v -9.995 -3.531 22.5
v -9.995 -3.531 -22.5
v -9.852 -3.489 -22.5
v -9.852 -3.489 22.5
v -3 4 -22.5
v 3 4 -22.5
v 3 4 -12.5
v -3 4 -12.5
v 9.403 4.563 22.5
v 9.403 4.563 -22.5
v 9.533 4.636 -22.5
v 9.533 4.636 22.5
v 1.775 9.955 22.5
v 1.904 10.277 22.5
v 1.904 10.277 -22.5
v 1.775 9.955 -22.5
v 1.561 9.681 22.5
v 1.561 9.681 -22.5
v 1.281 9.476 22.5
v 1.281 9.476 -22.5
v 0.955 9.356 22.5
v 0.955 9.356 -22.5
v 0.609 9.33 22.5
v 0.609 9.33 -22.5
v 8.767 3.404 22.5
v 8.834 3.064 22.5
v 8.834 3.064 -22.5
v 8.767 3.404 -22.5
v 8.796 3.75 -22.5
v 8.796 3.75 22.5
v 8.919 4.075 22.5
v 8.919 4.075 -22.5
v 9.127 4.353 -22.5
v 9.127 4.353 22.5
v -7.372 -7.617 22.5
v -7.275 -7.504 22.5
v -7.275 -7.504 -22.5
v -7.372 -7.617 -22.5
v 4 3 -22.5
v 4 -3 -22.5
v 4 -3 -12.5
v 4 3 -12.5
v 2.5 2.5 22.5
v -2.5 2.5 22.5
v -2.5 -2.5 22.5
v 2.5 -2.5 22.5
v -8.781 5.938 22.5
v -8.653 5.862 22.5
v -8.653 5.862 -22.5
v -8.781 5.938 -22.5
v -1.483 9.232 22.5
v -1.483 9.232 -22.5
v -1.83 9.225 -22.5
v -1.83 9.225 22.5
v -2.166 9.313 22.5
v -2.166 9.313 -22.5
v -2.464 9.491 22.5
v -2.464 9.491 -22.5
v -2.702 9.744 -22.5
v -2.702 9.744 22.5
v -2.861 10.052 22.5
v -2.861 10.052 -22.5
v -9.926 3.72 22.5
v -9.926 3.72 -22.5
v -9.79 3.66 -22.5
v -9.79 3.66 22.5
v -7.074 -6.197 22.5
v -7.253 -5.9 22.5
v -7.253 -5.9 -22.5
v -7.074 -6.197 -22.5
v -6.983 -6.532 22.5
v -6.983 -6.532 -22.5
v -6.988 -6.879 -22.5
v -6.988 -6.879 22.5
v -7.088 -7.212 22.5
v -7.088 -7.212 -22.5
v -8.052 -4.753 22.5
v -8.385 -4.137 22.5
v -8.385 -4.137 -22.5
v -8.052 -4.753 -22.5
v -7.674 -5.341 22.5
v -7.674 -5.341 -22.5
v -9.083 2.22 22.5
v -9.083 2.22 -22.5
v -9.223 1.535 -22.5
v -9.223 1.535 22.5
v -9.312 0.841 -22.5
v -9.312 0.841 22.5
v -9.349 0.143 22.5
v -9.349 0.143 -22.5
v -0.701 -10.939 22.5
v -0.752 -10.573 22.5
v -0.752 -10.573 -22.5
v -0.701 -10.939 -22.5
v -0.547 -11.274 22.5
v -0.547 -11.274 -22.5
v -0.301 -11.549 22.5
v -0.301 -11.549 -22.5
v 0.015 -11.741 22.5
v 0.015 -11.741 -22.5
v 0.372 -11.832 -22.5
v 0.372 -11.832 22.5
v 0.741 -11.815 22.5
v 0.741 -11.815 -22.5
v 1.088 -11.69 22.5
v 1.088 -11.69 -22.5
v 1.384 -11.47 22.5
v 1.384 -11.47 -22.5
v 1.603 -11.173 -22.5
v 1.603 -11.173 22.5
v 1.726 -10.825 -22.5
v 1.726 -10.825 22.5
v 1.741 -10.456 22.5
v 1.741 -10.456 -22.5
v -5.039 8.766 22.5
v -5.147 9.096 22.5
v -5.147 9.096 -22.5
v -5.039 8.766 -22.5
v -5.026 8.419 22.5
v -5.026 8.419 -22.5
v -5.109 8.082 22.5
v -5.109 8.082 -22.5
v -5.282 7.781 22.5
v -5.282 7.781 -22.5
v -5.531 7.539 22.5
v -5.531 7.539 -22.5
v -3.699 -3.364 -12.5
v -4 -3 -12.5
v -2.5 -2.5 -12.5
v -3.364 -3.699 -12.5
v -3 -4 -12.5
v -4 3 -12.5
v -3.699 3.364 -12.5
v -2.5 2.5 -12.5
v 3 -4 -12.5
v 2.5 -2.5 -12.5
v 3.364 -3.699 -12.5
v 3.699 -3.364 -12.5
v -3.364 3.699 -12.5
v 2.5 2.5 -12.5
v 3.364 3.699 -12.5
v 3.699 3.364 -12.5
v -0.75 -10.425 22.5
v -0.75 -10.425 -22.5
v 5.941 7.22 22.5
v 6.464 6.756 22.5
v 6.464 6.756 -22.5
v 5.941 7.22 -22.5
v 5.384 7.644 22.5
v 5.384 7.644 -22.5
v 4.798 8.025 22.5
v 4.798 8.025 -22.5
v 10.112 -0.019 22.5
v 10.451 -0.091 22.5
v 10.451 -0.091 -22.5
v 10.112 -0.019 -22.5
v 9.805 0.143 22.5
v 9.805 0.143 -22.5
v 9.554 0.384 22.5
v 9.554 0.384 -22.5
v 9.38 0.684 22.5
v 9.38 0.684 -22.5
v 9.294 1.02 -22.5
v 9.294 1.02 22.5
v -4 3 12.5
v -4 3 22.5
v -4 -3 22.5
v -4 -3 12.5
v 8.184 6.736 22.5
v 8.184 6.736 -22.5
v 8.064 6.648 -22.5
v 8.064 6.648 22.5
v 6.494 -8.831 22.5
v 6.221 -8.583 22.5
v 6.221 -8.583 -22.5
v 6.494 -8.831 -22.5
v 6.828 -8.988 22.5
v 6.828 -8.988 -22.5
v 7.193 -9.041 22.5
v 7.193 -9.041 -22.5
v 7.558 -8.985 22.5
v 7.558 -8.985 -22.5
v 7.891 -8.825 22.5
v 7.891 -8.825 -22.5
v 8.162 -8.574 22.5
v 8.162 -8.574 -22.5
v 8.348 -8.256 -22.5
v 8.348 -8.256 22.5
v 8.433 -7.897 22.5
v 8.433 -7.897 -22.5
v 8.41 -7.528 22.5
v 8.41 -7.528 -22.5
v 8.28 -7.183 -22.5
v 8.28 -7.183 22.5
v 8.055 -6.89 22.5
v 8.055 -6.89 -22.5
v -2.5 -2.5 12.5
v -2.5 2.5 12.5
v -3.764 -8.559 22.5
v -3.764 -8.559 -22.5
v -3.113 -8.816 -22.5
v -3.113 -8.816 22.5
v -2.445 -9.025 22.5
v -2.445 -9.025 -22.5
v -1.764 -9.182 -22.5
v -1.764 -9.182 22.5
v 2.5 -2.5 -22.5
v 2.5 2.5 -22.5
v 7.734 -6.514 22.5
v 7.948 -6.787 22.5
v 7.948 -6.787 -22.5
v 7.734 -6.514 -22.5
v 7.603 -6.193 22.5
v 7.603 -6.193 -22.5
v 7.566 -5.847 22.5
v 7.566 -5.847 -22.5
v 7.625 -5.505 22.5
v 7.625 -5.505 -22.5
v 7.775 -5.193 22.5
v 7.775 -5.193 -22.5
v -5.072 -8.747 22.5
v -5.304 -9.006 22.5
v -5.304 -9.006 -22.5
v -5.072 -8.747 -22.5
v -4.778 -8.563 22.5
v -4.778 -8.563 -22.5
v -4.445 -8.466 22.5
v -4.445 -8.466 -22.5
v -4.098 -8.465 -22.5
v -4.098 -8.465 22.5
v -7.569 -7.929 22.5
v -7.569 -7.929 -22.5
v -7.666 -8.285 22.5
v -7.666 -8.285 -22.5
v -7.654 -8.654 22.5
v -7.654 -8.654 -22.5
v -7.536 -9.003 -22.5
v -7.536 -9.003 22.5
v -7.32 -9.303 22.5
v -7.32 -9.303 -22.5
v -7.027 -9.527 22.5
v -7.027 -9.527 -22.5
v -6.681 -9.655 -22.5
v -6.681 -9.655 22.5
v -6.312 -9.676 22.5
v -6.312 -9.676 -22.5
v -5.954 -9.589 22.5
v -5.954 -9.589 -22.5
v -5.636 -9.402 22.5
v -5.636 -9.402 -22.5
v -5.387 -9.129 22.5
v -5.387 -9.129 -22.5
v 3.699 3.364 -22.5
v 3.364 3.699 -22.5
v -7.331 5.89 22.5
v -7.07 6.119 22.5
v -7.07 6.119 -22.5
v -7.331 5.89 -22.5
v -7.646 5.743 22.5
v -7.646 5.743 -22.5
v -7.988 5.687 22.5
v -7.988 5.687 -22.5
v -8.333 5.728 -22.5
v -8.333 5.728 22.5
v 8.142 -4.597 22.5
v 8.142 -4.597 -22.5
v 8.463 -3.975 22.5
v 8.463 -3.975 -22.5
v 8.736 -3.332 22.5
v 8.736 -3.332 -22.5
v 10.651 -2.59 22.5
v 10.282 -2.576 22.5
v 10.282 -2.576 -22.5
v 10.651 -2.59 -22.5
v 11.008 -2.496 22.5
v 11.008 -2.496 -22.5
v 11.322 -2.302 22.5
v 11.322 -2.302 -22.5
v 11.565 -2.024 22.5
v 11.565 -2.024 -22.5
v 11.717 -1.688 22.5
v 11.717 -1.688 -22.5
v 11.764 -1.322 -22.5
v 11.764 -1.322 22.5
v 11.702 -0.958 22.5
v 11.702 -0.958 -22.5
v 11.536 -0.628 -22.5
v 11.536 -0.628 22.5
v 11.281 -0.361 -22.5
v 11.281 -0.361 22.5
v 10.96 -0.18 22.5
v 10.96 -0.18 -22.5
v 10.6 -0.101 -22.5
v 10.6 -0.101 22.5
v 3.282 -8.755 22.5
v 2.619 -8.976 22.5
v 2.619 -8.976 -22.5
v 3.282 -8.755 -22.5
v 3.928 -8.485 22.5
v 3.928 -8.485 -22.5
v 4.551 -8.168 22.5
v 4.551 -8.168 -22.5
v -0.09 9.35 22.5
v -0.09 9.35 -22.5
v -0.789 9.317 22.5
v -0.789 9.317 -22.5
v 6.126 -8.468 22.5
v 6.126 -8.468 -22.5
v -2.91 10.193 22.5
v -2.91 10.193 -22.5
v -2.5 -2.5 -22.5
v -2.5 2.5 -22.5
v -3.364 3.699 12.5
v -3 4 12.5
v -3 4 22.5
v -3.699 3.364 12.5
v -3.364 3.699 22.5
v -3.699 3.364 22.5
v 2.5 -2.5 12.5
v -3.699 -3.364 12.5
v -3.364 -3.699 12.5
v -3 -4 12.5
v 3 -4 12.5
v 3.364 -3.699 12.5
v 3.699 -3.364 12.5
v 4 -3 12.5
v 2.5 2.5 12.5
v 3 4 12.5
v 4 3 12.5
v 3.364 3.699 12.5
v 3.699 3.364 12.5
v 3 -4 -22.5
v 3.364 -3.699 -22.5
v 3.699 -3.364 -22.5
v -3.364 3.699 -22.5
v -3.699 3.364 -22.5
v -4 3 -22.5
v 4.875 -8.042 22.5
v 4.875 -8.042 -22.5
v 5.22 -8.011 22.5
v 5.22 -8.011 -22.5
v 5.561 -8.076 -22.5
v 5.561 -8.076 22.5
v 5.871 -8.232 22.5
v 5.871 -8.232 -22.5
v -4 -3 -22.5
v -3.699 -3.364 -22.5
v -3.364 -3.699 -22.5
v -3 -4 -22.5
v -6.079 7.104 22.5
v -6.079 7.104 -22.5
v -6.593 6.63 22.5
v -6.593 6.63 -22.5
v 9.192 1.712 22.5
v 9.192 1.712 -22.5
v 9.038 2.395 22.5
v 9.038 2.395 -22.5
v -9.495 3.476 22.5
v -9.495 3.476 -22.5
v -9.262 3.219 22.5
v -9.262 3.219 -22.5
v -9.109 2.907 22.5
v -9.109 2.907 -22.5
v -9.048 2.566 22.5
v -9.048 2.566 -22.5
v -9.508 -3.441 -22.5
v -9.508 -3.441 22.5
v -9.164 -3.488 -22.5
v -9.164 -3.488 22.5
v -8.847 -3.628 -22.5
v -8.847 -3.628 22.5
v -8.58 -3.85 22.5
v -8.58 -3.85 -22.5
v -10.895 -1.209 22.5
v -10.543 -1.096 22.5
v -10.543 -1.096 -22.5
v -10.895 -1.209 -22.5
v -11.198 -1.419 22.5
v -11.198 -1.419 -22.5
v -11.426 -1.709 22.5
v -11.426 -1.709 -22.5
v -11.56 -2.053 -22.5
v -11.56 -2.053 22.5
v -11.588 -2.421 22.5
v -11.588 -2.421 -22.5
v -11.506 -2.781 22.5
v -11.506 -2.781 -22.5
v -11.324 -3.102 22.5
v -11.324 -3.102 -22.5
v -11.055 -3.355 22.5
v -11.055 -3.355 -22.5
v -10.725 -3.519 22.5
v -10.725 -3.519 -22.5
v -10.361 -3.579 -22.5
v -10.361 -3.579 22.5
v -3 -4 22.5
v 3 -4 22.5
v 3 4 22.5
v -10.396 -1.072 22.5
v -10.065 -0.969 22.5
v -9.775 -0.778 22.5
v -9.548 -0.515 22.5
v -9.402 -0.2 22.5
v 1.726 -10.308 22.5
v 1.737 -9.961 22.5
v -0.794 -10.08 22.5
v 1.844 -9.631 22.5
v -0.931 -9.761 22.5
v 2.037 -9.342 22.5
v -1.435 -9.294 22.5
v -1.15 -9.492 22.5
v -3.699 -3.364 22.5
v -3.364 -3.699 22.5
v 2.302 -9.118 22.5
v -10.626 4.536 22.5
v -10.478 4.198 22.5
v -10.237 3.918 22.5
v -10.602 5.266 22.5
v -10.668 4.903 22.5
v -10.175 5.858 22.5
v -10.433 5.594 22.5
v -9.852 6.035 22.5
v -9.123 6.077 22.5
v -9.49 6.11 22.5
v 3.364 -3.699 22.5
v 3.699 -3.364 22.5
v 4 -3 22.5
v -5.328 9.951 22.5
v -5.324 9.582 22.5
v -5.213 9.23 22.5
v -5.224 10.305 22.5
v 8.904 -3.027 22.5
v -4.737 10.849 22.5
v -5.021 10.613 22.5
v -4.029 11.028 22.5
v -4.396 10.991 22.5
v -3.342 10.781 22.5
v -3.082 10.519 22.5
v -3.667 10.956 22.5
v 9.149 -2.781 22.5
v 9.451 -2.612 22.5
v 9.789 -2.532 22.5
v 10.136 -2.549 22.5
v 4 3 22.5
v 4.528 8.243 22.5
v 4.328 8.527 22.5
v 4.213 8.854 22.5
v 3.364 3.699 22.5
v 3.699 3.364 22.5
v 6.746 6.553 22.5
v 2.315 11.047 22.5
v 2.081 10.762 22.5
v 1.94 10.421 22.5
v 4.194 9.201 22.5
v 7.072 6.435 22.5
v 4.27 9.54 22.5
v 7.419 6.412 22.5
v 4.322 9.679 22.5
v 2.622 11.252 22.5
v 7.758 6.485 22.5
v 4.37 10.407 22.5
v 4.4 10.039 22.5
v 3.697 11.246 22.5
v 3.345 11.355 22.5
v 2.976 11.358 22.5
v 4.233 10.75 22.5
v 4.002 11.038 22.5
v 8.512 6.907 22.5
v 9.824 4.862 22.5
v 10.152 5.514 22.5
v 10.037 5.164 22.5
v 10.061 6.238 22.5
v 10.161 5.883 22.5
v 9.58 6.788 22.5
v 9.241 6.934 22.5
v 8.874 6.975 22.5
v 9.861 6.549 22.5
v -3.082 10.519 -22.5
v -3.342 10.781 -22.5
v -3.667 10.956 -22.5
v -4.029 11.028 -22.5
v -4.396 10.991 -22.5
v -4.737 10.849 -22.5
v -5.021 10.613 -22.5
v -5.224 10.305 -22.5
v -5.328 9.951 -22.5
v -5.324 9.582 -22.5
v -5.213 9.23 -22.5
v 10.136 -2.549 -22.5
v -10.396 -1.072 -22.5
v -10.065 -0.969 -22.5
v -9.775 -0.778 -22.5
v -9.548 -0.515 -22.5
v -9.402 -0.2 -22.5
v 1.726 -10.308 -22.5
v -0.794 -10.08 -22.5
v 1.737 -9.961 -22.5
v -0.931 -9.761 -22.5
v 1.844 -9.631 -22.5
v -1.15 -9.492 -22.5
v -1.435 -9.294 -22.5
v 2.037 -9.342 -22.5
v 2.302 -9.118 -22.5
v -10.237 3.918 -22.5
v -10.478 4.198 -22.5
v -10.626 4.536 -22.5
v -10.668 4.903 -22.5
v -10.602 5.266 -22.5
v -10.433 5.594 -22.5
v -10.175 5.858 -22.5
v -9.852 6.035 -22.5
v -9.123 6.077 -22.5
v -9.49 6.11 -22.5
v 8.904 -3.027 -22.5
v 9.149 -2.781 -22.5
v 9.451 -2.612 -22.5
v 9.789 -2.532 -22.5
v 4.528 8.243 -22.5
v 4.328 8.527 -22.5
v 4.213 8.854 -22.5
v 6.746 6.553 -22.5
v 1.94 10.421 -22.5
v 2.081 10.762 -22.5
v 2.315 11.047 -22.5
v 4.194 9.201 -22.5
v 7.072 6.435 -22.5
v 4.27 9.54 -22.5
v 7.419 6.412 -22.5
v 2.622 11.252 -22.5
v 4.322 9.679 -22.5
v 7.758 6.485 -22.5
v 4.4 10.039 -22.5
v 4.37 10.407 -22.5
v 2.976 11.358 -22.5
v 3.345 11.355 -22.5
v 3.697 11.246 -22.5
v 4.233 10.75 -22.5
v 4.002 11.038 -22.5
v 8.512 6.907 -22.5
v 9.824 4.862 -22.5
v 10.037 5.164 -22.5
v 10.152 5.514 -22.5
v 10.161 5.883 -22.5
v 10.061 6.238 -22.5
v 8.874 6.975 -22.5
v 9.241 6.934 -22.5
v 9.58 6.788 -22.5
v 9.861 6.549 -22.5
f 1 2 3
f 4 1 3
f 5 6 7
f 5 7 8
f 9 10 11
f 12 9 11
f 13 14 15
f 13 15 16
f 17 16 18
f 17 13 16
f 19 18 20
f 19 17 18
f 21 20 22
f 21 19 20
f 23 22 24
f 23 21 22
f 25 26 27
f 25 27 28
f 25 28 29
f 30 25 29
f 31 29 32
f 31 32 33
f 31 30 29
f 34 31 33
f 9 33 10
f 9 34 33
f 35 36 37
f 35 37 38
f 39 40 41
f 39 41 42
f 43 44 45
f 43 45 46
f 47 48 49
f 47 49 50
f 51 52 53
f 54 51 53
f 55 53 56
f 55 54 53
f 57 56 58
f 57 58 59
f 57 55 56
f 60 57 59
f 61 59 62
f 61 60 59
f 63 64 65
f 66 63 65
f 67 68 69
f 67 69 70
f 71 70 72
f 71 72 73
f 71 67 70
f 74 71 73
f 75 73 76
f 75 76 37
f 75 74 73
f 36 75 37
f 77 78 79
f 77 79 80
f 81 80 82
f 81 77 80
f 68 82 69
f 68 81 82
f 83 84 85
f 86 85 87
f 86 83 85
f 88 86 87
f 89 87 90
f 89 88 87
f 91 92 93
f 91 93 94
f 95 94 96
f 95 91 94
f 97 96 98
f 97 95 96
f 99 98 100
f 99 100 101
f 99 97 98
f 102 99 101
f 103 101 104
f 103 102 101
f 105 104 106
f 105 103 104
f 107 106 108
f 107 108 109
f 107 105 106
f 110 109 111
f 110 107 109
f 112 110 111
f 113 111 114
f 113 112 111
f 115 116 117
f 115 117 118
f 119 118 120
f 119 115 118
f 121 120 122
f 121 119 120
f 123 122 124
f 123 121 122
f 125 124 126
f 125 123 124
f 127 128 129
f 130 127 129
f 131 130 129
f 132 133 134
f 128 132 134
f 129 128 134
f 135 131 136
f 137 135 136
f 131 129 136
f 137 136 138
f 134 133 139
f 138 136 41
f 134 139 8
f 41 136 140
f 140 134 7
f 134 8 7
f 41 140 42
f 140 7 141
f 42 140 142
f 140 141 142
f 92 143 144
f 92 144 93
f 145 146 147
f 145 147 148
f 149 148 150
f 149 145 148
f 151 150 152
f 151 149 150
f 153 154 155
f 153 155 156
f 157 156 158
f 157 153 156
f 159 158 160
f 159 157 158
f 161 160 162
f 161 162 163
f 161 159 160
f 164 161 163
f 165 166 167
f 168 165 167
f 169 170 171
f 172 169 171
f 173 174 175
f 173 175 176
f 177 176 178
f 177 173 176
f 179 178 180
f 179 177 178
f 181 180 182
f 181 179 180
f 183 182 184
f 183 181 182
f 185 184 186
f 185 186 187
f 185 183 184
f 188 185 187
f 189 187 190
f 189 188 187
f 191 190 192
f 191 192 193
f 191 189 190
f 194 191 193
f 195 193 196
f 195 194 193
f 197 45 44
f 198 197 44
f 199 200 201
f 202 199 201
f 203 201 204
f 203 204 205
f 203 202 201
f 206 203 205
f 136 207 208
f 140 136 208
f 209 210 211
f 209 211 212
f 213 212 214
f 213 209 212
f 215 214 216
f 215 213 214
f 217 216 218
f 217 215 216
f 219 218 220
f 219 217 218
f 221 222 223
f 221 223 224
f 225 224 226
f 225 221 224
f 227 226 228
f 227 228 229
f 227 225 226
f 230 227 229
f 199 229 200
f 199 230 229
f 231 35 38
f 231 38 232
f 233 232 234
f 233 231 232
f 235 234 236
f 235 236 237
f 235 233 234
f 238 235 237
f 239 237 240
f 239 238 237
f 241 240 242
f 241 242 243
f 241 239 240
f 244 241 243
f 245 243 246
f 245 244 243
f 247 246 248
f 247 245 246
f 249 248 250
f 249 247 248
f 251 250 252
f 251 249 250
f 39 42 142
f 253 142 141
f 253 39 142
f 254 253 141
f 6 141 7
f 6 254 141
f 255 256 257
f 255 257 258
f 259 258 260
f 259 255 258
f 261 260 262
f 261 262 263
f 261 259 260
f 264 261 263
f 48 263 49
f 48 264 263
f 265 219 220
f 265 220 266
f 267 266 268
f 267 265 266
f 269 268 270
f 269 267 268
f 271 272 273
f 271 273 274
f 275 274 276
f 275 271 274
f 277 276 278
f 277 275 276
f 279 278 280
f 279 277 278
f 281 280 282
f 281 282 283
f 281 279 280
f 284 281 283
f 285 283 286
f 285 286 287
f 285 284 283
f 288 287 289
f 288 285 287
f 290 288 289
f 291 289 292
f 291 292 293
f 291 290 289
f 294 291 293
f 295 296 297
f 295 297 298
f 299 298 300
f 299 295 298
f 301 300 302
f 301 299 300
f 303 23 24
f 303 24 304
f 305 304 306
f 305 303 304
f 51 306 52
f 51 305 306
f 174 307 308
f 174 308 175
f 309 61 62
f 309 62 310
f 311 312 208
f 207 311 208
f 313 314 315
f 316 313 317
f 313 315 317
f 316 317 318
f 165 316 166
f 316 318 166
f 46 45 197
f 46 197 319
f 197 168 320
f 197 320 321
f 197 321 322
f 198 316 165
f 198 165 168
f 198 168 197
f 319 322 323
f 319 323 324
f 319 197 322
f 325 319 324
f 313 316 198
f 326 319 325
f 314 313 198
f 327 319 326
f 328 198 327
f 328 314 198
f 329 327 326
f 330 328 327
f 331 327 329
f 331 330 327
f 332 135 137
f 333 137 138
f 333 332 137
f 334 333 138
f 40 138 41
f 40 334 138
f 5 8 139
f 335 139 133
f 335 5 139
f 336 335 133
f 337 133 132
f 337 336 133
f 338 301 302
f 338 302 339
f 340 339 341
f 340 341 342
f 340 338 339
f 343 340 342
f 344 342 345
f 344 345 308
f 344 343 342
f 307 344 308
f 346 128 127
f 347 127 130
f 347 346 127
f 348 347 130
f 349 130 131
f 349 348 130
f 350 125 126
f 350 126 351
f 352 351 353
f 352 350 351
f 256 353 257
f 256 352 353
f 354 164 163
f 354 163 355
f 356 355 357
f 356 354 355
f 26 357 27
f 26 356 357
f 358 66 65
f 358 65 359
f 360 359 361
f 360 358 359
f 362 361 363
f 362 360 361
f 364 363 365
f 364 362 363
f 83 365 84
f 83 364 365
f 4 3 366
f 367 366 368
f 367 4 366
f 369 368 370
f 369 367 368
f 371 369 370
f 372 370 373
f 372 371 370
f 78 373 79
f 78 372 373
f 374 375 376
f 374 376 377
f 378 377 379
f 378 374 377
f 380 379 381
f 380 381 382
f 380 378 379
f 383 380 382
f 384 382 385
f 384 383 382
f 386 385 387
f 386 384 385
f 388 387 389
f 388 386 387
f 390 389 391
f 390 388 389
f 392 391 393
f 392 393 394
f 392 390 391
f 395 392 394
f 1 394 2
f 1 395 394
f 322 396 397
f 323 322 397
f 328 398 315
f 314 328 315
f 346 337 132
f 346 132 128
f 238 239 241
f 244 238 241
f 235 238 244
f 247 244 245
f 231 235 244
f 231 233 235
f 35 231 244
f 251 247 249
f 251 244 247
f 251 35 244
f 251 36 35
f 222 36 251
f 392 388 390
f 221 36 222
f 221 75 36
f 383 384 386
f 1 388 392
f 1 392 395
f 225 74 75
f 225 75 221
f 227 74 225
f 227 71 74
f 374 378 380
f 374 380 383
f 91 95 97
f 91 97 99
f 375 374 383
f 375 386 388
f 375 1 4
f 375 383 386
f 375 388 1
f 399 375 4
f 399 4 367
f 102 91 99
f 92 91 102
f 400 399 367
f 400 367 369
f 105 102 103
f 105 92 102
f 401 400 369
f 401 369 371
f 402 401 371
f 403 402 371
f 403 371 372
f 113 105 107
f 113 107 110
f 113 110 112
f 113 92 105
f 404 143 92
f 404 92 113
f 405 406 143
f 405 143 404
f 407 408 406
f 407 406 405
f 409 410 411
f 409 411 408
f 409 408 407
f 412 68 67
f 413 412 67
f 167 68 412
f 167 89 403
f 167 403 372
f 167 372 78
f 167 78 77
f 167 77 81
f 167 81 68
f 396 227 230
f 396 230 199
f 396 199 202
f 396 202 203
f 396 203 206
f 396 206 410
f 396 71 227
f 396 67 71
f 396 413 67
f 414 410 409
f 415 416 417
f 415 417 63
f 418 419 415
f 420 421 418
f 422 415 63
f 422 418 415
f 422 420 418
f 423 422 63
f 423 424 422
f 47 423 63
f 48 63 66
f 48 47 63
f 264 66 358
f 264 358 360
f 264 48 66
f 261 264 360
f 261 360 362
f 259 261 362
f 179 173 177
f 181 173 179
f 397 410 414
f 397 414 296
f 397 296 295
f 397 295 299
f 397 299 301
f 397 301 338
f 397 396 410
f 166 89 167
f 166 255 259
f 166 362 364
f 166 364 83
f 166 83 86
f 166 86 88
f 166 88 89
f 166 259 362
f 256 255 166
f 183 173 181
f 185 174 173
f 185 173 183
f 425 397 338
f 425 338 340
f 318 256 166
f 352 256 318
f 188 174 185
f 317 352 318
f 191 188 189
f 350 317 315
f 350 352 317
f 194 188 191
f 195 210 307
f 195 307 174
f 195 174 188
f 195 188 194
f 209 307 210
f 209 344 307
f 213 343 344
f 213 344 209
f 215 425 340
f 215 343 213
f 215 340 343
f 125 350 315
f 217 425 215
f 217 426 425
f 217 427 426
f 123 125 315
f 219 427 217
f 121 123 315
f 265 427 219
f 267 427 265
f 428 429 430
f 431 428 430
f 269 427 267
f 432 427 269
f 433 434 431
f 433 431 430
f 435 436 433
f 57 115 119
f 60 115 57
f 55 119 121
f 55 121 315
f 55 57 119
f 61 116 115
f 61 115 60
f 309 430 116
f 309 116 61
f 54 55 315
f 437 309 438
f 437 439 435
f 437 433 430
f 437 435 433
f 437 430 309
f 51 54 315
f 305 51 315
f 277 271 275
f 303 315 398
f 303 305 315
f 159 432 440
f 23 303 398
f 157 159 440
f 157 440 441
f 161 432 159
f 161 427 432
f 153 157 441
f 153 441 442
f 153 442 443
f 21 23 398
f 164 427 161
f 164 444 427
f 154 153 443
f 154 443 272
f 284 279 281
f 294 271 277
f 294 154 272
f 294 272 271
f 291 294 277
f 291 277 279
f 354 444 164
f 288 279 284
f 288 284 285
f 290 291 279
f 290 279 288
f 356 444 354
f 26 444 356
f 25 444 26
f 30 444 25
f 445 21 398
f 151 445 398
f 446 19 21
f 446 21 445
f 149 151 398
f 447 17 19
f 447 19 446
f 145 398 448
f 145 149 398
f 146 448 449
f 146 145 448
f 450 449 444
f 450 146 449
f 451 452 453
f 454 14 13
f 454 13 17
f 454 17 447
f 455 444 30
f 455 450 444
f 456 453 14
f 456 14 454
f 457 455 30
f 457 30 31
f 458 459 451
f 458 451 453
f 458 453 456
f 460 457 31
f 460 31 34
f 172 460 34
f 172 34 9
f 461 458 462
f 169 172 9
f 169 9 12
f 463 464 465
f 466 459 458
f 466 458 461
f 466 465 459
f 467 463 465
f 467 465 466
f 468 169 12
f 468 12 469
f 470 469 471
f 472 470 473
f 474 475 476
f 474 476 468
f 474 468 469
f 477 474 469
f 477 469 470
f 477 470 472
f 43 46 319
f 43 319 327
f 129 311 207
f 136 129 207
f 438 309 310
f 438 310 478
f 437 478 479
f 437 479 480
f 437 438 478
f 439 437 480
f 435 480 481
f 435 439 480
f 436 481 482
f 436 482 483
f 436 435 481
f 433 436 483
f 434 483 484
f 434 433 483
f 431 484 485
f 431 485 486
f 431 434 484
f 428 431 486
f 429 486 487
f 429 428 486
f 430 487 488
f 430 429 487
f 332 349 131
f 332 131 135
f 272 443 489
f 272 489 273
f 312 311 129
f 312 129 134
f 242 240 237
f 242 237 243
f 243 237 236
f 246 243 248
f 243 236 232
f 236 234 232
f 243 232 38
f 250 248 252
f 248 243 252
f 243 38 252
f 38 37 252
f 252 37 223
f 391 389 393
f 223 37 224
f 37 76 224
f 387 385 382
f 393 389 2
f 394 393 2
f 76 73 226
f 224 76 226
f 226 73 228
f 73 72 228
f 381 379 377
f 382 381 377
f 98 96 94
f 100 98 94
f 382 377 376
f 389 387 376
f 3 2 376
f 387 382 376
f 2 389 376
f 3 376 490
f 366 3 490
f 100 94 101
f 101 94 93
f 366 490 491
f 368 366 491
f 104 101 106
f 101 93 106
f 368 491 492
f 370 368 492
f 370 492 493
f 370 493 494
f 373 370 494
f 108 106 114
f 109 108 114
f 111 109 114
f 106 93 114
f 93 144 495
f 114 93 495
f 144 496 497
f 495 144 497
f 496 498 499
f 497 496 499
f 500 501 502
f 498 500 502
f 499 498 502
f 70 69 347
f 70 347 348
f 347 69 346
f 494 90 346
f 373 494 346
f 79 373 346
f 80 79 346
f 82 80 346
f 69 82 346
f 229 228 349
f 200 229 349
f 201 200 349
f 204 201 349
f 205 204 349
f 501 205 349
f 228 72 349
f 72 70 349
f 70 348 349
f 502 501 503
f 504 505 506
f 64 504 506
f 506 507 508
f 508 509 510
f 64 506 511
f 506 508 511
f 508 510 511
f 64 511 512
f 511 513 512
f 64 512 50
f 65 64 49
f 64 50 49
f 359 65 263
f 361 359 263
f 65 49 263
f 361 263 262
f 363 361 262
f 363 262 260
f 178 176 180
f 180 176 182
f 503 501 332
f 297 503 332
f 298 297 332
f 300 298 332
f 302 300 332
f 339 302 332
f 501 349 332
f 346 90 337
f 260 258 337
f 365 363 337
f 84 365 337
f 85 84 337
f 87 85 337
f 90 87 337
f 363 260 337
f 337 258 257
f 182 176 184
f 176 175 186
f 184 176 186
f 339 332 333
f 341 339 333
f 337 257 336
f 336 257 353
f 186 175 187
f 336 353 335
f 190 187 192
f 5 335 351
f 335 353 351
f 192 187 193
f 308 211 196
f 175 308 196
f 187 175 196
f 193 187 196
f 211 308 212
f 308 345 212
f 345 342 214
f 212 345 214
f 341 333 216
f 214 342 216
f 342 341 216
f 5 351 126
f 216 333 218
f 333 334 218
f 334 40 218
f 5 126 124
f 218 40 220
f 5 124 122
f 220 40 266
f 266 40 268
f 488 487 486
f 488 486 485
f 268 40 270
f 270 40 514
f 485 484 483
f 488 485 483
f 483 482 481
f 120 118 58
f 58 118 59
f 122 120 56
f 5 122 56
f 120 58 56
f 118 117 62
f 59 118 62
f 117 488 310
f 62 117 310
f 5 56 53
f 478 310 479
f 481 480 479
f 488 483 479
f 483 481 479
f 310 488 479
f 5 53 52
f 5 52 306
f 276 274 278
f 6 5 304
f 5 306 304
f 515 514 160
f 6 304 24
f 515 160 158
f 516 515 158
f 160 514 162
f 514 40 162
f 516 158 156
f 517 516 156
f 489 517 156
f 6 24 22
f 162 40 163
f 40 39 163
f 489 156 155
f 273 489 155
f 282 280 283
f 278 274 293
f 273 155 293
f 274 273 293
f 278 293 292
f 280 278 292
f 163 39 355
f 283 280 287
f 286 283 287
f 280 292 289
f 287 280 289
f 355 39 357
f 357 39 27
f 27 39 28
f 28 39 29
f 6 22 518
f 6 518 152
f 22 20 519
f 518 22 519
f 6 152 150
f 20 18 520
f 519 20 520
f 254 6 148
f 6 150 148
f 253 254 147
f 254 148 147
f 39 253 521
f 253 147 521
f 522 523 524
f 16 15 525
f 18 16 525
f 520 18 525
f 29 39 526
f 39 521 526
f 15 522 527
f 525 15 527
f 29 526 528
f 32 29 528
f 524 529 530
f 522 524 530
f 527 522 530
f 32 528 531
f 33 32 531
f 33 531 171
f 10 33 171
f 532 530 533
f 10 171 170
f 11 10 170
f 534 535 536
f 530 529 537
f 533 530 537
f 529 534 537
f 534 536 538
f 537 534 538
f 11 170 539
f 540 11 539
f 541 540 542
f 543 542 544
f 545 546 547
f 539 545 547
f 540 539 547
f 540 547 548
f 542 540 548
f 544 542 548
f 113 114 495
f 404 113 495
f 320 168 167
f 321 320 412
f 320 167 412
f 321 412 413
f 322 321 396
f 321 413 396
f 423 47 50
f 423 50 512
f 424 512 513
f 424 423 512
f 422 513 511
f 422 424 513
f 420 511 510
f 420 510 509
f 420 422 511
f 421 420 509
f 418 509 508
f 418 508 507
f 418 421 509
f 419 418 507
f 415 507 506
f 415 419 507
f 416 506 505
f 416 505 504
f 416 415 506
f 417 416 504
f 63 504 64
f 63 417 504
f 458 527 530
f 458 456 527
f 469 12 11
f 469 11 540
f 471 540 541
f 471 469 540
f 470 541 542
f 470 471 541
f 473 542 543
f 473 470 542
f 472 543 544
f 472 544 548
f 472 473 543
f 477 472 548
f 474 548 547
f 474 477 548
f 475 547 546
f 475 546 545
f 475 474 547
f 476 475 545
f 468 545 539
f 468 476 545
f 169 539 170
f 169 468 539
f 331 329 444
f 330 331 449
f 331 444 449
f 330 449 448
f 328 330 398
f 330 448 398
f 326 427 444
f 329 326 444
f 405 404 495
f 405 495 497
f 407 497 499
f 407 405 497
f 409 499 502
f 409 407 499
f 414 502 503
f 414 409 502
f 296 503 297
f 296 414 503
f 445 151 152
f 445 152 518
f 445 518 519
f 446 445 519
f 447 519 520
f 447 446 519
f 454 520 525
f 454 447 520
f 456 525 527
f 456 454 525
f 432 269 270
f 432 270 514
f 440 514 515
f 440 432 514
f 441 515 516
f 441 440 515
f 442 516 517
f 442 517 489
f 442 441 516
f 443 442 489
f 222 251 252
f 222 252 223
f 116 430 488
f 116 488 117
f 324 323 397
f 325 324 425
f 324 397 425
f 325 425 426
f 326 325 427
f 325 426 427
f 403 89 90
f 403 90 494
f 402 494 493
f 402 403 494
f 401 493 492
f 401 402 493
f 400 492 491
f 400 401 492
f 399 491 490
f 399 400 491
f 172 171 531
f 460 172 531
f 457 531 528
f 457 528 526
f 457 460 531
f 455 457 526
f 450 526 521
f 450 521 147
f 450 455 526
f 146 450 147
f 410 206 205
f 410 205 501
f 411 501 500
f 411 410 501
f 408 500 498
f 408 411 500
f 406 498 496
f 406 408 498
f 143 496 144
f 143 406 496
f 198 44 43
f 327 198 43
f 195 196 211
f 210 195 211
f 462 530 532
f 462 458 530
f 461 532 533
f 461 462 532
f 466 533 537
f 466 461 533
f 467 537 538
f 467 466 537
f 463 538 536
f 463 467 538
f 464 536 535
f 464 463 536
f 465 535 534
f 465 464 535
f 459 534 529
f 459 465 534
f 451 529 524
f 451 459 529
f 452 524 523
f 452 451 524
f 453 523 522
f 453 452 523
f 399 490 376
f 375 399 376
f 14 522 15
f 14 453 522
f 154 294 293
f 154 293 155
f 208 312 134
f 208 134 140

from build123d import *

# Parameters (mm, degrees)
BOSS_EXTRUDE1_DEPTH = 22.5
SKETCH2_W           = 5
SKETCH2_H           = 5
CUT_EXTRUDE1_DEPTH  = 10


with BuildPart() as part:
    # Sketch1 → Boss-Extrude1 (new, symmetric)
    with BuildSketch(Plane.XY):
        with BuildLine():
            Line((1.939814393, 10.4209942), (1.904028006, 10.276656915))
            ThreePointArc((1.904028006, 10.276656915), (1.428480454, 9.568373768), (0.609305018, 9.330125797))
            ThreePointArc((0.609305018, 9.330125797), (-0.439609364, 9.339659716), (-1.482990759, 9.231643321))
            ThreePointArc((-1.482990759, 9.231643321), (-2.320923107, 9.391892722), (-2.860897269, 10.052376178))
            Line((-2.860897269, 10.052376178), (-2.910083052, 10.192713899))
            ThreePointArc((-2.910083052, 10.192713899), (-4.572008101, 10.932485624), (-5.212501917, 9.229833356))
            Line((-5.212501917, 9.229833356), (-5.14713766, 9.096261535))
            ThreePointArc((-5.14713766, 9.096261535), (-5.056152588, 8.248009091), (-5.530534536, 7.538944737))
            ThreePointArc((-5.530534536, 7.538944737), (-6.340177854, 6.872018974), (-7.070022774, 6.118600982))
            ThreePointArc((-7.070022774, 6.118600982), (-7.814922522, 5.702746613), (-8.65311731, 5.861617594))
            Line((-8.65311731, 5.861617594), (-8.781003154, 5.937506514))
            ThreePointArc((-8.781003154, 5.937506514), (-10.529627702, 5.435939703), (-9.925830648, 3.719930906))
            Line((-9.925830648, 3.719930906), (-9.789900412, 3.659624288))
            ThreePointArc((-9.789900412, 3.659624288), (-9.174955642, 3.068309294), (-9.082575516, 2.220207648))
            ThreePointArc((-9.082575516, 2.220207648), (-9.274106664, 1.18888418), (-9.348912558, 0.142597243))
            ThreePointArc((-9.348912558, 0.142597243), (-9.652232836, -0.654778014), (-10.396447593, -1.071857007))
            Line((-10.396447593, -1.071857007), (-10.543194291, -1.095926157))
            ThreePointArc((-10.543194291, -1.095926157), (-11.560317477, -2.604142819), (-9.994752906, -3.530568558))
            Line((-9.994752906, -3.530568558), (-9.851859958, -3.489391835))
            ThreePointArc((-9.851859958, -3.489391835), (-9.000694983, -3.547086522), (-8.38477847, -4.137389275))
            ThreePointArc((-8.38477847, -4.137389275), (-7.868577895, -5.050542735), (-7.253342256, -5.900129331))
            ThreePointArc((-7.253342256, -5.900129331), (-6.973156133, -6.705924732), (-7.275164503, -7.503797802))
            Line((-7.275164503, -7.503797802), (-7.372107645, -7.616562799))
            ThreePointArc((-7.372107645, -7.616562799), (-7.181806226, -9.425717974), (-5.3870192, -9.129075755))
            Line((-5.3870192, -9.129075755), (-5.304024738, -9.005682738))
            ThreePointArc((-5.304024738, -9.005682738), (-4.614909109, -8.502761133), (-3.763650392, -8.559055773))
            ThreePointArc((-3.763650392, -8.559055773), (-2.781254079, -8.926764573), (-1.763852499, -9.182119818))
            ThreePointArc((-1.763852499, -9.182119818), (-1.031262177, -9.61929474), (-0.749751088, -10.424628209))
            Line((-0.749751088, -10.424628209), (-0.751529899, -10.573325059))
            ThreePointArc((-0.751529899, -10.573325059), (0.557151975, -11.836894934), (1.74136066, -10.455986948))
            Line((1.74136066, -10.455986948), (1.725622604, -10.308114601))
            ThreePointArc((1.725622604, -10.308114601), (1.930244025, -9.479899312), (2.618531533, -8.975844952))
            ThreePointArc((2.618531533, -8.975844952), (3.60744943, -8.626054058), (4.550963444, -8.167694395))
            ThreePointArc((4.550963444, -8.167694395), (5.393170812, -8.031689832), (6.126479194, -8.467659221))
            Line((6.126479194, -8.467659221), (6.220697038, -8.582711015))
            ThreePointArc((6.220697038, -8.582711015), (8.035412575, -8.709457202), (8.054938514, -6.890425643))
            Line((8.054938514, -6.890425643), (7.947831951, -6.78726508))
            ThreePointArc((7.947831951, -6.78726508), (7.572214528, -6.021287246), (7.775473452, -5.192736523))
            ThreePointArc((7.775473452, -5.192736523), (8.308187259, -4.289116981), (8.736333014, -3.33151399))
            ThreePointArc((8.736333014, -3.33151399), (9.29407924, -2.68596799), (10.136061773, -2.548578376))
            Line((10.136061773, -2.548578376), (10.282190696, -2.5761511))
            ThreePointArc((10.282190696, -2.5761511), (11.753814328, -1.50676765), (10.599521117, -0.100757601))
            Line((10.599521117, -0.100757601), (10.451162399, -0.090578797))
            ThreePointArc((10.451162399, -0.090578797), (9.671061698, 0.254752041), (9.294184928, 1.020111037))
            ThreePointArc((9.294184928, 1.020111037), (9.121431934, 2.0547456), (8.833875273, 3.063518836))
            ThreePointArc((8.833875273, 3.063518836), (8.8461847, 3.916548126), (9.402868399, 4.563010616))
            Line((9.402868399, 4.563010616), (9.532533054, 4.635818545))
            ThreePointArc((9.532533054, 4.635818545), (9.972475727, 6.400955231), (8.184469989, 6.736056042))
            Line((8.184469989, 6.736056042), (8.064277808, 6.648490313))
            ThreePointArc((8.064277808, 6.648490313), (7.244711617, 6.411590018), (6.464043982, 6.755637305))
            ThreePointArc((6.464043982, 6.755637305), (5.666657234, 7.437169878), (4.797949114, 8.025097152))
            ThreePointArc((4.797949114, 8.025097152), (4.259062024, 8.686467846), (4.269968399, 9.539516228))
            Line((4.269968399, 9.539516228), (4.322497253, 9.678637172))
            ThreePointArc((4.322497253, 9.678637172), (3.524904902, 11.313600021), (1.939814393, 10.4209942))
        make_face()
    extrude(amount=BOSS_EXTRUDE1_DEPTH, both=True)

    # Sketch2 → Cut-Extrude1 (cut)
    with BuildSketch(Plane.XY.offset(22.5)):
        with BuildLine():
            Line((-3, -4), (3, -4))
            ThreePointArc((3, -4), (3.535533906, -3.535533906), (4, -3))
            Line((4, -3), (4, 3))
            ThreePointArc((4, 3), (3.535533906, 3.535533906), (3, 4))
            Line((3, 4), (-3, 4))
            ThreePointArc((-3, 4), (-3.535533906, 3.535533906), (-4, 3))
            Line((-4, 3), (-4, -3))
            ThreePointArc((-4, -3), (-3.535533906, -3.535533906), (-3, -4))
        make_face()
        Rectangle(SKETCH2_W, SKETCH2_H, mode=Mode.SUBTRACT)
    cut_extrude1 = extrude(amount=-CUT_EXTRUDE1_DEPTH, mode=Mode.SUBTRACT)

    # Mirror1: Cut-Extrude1 across plane
    add(cut_extrude1.mirror(Plane.XY), mode=Mode.SUBTRACT)


solid = part.part
